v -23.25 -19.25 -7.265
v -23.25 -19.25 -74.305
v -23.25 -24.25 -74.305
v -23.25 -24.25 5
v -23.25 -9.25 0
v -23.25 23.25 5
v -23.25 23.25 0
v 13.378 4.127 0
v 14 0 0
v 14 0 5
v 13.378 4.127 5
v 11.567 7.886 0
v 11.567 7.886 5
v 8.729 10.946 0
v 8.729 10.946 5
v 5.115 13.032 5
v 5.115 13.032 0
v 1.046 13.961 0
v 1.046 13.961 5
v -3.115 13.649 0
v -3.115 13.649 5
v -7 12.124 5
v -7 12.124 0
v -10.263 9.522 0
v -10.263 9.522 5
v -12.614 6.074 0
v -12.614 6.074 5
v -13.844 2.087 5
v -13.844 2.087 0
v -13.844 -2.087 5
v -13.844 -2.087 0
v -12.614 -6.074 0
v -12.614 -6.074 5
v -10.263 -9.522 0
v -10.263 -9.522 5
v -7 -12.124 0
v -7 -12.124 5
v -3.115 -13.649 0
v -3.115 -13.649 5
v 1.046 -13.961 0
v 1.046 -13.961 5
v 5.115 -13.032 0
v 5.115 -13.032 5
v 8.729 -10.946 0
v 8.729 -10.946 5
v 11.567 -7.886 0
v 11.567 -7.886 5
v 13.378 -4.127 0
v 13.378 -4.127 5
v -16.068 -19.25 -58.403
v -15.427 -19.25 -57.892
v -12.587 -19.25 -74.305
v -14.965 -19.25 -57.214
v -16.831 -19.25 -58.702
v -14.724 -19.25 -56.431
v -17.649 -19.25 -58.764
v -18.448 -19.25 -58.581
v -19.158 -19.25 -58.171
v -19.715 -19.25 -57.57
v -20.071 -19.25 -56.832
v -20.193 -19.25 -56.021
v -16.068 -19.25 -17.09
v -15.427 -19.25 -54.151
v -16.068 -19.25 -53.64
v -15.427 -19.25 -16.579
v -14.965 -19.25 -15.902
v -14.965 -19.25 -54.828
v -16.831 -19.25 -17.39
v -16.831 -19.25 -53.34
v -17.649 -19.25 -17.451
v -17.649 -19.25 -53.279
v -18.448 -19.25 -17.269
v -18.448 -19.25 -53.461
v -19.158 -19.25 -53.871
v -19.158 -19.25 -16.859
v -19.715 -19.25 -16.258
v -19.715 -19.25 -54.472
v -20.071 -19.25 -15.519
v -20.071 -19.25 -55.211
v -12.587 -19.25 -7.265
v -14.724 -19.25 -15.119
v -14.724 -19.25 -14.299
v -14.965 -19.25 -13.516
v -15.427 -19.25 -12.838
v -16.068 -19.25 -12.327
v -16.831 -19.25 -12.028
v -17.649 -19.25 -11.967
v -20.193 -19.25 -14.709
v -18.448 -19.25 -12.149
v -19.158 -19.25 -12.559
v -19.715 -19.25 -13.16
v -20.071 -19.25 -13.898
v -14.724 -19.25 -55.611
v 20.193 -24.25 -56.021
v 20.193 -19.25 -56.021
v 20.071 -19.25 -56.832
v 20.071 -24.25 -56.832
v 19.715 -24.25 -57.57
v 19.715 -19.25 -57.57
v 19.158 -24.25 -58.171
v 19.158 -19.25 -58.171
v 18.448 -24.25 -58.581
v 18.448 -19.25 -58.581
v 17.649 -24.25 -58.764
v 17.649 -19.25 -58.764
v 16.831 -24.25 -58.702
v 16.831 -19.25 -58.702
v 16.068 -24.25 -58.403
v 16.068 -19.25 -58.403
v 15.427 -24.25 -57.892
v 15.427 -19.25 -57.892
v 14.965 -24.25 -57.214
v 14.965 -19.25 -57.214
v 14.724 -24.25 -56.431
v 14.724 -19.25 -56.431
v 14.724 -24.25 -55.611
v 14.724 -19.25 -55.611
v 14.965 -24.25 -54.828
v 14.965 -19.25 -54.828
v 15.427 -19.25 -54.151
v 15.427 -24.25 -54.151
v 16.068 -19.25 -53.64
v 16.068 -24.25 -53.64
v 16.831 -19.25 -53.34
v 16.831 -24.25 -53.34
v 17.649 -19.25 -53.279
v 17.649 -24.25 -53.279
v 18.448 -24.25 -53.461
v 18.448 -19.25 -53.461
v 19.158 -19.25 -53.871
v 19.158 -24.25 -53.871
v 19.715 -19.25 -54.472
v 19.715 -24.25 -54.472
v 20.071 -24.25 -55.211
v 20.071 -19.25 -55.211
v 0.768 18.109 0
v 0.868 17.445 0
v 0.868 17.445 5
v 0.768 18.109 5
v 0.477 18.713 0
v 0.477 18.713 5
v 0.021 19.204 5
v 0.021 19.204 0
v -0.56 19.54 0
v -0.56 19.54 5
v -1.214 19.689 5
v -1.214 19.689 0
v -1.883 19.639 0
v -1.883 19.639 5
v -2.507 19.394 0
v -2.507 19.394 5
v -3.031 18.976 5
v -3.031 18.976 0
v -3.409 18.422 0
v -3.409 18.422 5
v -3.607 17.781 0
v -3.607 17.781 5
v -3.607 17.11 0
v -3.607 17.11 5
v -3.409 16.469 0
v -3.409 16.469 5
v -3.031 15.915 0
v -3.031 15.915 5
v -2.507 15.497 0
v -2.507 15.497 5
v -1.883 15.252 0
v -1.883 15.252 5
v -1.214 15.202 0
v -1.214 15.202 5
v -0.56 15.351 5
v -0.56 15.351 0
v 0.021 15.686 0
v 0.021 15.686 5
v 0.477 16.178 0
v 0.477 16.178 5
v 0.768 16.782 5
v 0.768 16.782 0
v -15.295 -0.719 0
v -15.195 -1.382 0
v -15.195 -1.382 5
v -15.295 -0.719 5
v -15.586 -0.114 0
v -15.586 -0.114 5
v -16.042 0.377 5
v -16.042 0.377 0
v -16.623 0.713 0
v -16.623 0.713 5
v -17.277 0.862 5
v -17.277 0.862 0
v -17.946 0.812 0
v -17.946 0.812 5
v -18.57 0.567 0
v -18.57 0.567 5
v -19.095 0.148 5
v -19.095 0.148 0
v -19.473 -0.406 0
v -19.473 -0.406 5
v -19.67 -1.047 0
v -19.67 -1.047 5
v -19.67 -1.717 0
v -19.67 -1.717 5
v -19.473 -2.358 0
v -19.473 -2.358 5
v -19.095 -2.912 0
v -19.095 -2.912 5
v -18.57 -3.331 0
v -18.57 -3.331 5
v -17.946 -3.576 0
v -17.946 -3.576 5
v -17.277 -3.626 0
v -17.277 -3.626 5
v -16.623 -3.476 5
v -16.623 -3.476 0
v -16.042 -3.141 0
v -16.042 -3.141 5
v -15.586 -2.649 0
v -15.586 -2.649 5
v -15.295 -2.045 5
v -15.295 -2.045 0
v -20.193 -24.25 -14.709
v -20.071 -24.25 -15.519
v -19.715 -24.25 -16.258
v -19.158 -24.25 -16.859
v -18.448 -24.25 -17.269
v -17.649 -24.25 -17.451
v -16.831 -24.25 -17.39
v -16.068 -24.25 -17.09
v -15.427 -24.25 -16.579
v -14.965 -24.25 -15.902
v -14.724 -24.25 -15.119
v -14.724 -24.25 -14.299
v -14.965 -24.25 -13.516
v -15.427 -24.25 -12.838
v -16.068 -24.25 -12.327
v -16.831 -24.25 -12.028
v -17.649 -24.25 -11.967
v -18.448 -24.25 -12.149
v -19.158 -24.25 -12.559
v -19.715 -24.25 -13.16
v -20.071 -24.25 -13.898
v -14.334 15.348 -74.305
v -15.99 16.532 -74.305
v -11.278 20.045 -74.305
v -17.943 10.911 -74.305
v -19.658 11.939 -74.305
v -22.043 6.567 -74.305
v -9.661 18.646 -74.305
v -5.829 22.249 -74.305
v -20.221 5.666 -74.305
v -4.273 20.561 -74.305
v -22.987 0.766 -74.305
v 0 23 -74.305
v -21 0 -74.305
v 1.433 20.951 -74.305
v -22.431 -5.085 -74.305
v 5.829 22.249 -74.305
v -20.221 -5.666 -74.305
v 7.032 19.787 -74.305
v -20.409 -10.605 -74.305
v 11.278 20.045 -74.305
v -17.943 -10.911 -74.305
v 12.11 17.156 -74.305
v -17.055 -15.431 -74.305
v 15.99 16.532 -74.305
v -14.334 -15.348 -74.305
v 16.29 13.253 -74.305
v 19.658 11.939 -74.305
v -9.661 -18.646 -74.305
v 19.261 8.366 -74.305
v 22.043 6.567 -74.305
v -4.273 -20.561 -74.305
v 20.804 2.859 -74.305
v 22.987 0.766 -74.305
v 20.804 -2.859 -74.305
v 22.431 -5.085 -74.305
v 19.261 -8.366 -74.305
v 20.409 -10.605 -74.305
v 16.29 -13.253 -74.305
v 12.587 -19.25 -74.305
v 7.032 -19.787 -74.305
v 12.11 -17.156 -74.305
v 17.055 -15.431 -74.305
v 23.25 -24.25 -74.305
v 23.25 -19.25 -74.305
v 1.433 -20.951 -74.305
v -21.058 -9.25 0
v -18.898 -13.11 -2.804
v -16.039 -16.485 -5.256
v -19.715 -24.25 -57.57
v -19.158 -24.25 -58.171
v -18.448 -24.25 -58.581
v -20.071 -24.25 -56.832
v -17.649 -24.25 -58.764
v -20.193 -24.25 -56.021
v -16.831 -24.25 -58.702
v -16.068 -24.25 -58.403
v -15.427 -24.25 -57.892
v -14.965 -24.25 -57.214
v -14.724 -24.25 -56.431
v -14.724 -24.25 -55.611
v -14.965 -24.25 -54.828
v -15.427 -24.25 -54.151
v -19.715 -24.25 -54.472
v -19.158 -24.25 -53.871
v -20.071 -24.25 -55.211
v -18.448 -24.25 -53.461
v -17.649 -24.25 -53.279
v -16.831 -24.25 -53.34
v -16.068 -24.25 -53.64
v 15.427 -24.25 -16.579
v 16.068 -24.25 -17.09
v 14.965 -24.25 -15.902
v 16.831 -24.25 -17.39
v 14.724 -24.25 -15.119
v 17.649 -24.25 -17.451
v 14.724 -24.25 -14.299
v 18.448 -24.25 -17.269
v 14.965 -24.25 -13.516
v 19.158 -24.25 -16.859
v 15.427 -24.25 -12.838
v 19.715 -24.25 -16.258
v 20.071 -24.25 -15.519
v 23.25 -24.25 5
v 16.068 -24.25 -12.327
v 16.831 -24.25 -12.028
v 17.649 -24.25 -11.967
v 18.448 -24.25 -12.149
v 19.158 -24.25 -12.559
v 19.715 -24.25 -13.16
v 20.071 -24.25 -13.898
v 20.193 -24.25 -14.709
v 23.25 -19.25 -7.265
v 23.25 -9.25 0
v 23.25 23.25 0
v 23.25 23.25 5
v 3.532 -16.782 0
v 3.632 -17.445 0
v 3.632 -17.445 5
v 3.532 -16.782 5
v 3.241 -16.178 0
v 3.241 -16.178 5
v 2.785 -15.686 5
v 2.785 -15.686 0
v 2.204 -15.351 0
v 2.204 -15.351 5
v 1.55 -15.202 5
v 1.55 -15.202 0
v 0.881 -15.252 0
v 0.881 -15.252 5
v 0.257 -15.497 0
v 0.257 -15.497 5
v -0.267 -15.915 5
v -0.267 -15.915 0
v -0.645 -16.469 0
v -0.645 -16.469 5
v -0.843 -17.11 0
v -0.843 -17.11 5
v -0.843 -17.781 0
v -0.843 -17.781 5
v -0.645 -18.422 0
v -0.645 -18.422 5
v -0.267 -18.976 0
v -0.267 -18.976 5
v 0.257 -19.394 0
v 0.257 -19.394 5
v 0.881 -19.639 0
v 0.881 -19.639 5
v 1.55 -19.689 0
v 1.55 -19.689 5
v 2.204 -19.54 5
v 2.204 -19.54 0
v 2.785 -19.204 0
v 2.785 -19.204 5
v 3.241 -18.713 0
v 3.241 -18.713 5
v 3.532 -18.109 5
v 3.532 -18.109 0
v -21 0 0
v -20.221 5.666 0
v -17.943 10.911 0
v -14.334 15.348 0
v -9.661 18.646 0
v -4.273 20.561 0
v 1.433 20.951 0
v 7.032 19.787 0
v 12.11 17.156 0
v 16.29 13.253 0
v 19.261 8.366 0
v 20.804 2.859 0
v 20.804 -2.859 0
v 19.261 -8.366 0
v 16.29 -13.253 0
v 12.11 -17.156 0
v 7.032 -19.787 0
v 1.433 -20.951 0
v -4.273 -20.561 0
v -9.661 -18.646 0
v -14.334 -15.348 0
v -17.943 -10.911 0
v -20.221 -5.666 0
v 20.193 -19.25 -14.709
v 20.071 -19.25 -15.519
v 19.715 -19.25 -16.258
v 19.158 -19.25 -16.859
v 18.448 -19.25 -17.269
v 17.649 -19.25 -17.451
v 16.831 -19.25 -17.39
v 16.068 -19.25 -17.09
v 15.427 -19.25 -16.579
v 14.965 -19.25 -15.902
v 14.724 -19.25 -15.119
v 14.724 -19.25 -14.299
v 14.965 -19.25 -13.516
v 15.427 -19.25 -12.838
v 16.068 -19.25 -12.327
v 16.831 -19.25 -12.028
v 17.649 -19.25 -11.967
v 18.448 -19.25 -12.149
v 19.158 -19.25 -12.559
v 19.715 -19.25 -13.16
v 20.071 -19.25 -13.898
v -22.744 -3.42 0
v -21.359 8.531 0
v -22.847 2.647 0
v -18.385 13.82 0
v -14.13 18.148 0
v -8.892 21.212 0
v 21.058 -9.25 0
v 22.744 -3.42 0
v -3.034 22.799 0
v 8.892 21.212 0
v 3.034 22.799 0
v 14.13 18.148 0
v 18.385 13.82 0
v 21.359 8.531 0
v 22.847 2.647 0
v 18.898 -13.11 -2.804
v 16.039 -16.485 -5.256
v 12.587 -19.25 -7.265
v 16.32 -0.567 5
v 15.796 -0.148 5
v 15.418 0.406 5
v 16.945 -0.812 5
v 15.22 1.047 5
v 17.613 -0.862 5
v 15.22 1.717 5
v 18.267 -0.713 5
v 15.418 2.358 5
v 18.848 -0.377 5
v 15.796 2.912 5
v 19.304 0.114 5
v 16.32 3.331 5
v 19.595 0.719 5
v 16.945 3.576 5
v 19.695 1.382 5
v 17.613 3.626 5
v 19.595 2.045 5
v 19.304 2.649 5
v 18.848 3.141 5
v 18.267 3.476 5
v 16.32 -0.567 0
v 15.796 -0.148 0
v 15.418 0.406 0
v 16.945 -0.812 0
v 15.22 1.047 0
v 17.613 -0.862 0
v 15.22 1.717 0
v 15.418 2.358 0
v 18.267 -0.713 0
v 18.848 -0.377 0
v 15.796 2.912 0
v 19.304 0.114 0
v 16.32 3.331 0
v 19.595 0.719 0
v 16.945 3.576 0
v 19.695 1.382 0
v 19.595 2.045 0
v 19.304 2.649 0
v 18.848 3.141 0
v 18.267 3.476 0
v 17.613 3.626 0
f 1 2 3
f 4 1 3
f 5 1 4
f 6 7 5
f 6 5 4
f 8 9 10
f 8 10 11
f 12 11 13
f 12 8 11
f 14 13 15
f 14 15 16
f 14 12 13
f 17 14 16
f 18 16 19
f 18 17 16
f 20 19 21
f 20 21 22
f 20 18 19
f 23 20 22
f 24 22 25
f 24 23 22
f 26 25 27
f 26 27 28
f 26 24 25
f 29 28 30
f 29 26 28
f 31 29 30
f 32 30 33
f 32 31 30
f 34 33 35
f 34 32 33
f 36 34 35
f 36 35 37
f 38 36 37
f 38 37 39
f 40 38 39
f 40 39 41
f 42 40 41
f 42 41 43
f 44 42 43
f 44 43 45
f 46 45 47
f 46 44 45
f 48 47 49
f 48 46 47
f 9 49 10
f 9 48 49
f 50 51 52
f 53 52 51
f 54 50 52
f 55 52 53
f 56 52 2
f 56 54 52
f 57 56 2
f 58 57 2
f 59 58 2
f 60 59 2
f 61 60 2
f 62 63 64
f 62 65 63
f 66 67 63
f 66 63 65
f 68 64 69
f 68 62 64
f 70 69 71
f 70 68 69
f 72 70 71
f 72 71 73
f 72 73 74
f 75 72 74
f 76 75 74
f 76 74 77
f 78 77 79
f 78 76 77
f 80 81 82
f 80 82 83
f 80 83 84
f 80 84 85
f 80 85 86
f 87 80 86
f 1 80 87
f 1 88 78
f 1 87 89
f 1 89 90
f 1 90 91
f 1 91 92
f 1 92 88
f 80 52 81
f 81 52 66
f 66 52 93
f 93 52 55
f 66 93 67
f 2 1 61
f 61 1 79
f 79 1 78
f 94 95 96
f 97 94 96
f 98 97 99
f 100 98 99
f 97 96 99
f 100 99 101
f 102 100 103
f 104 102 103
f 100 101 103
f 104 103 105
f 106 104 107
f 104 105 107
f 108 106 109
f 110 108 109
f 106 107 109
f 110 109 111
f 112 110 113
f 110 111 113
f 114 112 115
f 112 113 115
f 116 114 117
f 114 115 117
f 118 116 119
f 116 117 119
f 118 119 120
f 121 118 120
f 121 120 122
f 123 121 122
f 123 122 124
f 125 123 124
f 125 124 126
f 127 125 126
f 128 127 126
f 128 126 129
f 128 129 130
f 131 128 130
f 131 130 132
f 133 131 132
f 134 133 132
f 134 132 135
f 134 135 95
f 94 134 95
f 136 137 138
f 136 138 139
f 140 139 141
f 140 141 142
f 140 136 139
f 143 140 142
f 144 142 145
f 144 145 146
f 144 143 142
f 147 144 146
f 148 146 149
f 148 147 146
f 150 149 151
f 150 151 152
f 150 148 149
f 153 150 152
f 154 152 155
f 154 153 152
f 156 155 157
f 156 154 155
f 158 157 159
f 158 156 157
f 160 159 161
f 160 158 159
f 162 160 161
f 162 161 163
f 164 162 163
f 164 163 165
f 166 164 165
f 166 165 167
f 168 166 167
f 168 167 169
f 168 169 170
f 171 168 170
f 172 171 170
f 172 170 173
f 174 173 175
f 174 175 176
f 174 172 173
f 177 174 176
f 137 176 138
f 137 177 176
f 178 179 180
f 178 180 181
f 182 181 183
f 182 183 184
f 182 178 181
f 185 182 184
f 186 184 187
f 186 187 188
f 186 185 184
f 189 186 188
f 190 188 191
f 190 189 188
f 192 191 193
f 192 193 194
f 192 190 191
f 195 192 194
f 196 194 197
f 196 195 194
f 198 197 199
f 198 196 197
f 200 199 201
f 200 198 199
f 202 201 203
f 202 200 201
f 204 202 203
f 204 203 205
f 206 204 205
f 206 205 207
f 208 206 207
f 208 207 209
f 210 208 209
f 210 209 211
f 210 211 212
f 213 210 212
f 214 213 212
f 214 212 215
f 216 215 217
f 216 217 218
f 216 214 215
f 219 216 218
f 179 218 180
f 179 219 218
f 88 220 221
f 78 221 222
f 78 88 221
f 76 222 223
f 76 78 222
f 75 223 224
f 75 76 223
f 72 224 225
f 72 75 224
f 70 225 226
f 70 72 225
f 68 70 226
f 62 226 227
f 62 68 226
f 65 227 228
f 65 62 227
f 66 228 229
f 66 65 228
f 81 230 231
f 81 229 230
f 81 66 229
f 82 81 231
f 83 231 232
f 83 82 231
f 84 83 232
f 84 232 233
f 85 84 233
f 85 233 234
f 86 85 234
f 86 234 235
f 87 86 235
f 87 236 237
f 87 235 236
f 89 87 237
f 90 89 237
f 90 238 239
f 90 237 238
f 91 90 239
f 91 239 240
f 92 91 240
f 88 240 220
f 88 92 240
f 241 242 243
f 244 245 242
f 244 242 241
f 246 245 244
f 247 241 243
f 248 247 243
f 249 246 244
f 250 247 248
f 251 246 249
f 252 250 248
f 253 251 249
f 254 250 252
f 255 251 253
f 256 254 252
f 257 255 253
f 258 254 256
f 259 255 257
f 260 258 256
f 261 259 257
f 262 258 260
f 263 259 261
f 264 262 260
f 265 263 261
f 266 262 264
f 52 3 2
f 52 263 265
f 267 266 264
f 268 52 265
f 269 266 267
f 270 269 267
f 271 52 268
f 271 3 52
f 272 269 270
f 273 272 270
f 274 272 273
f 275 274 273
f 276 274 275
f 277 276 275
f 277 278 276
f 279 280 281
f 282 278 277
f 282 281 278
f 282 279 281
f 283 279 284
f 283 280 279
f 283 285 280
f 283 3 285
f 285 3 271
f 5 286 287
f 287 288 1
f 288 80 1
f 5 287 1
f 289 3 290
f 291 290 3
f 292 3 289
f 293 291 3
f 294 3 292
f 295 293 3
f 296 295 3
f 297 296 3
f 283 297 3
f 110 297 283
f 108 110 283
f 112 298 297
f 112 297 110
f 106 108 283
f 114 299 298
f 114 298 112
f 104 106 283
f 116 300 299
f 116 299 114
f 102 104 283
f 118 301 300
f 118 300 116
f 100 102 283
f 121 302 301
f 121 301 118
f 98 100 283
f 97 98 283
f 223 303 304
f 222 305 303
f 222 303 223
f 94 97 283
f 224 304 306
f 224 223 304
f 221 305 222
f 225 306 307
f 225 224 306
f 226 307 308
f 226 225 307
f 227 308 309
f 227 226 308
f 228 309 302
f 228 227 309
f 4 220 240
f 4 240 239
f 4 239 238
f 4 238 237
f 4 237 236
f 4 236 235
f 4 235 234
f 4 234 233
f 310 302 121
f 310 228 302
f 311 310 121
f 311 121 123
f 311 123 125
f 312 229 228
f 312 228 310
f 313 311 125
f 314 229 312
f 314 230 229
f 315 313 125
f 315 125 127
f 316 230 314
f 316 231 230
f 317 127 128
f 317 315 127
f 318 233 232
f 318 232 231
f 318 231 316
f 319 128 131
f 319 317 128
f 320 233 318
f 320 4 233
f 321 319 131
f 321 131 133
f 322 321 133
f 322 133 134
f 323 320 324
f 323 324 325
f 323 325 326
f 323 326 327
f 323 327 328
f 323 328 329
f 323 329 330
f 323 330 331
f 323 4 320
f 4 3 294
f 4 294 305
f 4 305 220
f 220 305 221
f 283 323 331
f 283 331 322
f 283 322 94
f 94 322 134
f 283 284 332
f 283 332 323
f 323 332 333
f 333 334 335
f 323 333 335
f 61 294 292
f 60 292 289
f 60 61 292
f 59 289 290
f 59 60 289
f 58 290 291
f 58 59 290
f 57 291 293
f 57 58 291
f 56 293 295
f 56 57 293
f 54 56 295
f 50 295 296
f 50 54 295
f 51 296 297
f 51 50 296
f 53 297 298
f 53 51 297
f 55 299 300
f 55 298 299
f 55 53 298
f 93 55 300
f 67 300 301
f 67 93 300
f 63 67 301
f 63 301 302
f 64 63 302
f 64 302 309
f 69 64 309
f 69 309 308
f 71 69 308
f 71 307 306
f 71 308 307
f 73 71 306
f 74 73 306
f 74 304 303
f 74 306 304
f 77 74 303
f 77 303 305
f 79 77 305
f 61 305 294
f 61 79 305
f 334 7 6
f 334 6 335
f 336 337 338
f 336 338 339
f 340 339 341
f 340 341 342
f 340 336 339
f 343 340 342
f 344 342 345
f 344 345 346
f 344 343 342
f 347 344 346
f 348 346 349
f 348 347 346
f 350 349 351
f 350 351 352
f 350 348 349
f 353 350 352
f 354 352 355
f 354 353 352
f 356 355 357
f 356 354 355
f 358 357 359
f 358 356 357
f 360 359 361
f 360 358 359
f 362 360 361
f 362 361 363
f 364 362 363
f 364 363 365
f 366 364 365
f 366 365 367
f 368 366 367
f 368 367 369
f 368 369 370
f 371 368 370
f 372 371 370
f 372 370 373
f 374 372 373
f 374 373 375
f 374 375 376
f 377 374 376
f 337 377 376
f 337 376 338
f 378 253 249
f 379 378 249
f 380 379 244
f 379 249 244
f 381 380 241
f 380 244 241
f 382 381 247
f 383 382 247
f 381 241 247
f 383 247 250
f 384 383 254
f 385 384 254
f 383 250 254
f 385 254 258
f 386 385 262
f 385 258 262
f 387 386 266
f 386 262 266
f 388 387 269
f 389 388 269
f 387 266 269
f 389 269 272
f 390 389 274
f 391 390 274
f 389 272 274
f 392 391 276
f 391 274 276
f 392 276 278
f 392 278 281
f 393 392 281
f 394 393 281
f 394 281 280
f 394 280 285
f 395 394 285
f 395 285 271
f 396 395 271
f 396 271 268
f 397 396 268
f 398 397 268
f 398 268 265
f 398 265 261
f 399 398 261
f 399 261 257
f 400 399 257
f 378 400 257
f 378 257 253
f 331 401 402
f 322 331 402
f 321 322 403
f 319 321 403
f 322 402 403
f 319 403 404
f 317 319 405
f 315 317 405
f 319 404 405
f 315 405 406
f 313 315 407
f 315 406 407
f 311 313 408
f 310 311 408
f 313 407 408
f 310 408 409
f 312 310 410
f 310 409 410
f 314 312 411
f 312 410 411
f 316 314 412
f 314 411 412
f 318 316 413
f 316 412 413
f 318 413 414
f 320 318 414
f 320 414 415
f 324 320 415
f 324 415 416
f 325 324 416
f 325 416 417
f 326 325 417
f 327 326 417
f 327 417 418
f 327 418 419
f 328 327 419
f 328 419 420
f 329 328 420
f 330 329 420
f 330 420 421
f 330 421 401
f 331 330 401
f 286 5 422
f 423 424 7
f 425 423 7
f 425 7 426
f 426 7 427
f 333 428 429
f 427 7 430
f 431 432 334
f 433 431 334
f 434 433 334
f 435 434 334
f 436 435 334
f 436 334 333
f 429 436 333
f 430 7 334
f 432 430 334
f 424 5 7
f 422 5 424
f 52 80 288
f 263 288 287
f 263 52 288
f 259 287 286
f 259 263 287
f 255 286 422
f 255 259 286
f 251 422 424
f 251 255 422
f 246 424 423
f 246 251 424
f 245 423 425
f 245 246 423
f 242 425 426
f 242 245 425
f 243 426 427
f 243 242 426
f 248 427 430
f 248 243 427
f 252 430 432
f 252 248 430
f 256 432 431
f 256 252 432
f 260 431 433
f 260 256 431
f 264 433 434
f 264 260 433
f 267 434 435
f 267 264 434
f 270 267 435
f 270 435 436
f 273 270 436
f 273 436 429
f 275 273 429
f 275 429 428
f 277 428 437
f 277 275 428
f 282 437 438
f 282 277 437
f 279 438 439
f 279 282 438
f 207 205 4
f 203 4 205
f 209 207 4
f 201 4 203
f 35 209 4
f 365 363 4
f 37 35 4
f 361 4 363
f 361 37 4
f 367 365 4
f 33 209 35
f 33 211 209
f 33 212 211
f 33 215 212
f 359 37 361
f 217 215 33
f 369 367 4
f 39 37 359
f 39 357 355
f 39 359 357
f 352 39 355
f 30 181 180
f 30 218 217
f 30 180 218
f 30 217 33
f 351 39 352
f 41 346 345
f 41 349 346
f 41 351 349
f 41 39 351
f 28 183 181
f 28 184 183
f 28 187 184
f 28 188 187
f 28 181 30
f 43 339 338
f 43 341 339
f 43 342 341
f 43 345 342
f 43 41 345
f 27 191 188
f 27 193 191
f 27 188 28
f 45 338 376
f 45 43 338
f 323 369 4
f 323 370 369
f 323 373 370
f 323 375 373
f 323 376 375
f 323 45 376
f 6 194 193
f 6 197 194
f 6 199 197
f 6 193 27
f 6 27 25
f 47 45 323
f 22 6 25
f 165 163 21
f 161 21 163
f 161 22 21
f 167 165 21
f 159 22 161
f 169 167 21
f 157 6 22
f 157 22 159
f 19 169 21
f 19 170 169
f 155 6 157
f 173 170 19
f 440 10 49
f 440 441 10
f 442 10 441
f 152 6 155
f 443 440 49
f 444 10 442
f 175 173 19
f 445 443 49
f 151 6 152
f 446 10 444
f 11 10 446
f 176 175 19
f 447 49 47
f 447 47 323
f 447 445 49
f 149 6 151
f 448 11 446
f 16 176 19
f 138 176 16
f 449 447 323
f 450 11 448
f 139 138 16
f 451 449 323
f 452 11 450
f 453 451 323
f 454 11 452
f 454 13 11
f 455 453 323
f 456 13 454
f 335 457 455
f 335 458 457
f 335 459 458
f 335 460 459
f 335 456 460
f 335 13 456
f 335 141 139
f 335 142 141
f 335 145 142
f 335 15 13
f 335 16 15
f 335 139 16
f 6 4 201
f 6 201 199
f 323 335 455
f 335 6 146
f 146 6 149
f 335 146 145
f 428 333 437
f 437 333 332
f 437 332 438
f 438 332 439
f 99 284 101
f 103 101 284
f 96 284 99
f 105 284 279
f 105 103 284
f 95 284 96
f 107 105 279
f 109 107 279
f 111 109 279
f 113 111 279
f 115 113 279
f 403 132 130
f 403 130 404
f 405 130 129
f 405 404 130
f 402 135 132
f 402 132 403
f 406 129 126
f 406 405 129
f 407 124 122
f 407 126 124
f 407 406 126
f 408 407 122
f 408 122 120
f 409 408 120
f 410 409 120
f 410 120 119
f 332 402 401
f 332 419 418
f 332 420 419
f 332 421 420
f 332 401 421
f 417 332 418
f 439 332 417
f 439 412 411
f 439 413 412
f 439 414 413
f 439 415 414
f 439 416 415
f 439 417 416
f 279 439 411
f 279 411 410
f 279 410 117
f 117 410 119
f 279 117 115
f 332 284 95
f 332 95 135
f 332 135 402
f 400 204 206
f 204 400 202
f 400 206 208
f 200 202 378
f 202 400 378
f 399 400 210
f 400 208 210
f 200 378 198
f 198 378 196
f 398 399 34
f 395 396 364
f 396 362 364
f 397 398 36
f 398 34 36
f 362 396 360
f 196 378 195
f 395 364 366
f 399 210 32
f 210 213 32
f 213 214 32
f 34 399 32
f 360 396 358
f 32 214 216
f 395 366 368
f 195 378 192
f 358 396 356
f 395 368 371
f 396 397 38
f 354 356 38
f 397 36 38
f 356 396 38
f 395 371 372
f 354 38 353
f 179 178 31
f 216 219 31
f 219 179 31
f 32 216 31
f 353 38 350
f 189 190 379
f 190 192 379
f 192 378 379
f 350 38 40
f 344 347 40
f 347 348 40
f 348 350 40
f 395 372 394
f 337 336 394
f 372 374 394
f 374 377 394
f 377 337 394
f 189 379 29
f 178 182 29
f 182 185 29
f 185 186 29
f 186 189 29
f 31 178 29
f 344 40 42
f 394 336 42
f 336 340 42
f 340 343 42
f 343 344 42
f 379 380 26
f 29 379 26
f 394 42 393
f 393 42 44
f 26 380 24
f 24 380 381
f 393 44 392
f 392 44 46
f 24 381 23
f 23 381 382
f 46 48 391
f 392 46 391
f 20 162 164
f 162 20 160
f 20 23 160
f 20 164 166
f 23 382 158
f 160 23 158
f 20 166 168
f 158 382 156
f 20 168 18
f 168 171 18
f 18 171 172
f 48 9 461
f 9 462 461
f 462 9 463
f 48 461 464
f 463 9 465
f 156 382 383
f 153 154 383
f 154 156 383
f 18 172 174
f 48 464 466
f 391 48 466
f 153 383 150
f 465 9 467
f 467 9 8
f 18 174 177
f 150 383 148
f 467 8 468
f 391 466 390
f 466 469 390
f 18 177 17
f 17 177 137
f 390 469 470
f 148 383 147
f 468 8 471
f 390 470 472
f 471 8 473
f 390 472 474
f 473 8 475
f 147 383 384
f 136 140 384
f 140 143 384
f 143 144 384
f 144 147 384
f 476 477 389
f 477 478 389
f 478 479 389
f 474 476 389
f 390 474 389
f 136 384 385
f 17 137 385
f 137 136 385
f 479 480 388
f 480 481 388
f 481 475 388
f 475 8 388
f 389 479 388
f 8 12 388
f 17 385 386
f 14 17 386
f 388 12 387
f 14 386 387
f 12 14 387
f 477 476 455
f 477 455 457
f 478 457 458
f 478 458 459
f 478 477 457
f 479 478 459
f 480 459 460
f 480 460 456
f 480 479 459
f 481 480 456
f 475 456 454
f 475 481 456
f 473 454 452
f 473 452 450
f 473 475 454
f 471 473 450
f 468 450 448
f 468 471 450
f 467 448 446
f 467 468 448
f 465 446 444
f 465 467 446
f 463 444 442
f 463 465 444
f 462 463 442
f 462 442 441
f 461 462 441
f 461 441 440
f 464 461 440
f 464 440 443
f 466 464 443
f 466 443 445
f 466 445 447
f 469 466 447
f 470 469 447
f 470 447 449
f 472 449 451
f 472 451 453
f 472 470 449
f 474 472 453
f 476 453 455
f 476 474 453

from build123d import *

# Parameters (mm, degrees)
SKETCH1_W           = 46.5
SKETCH1_H           = 46.5
SKETCH1_R           = 14
SKETCH1_R_2         = 2.25
BOSS_EXTRUDE1_DEPTH = 5
SKETCH2_W           = 46.5
SKETCH2_H           = 5
BOSS_EXTRUDE2_DEPTH = 149
SKETCH4_W           = 46.5
SKETCH4_H           = 5
BOSS_EXTRUDE3_DEPTH = 1
SKETCH5_R           = 2.75
CUT_EXTRUDE1_DEPTH  = 10
SKETCH9_R           = 23
CUT_EXTRUDE2_DEPTH  = 149
SKETCH10_R          = 23
SKETCH10_R_2        = 21
BOSS_EXTRUDE4_DEPTH = 149
CHAMFER1_SIZE       = 10
CHAMFER1_SIZE2      = 7.26542528
CHAMFER2_SIZE       = 10
CHAMFER2_SIZE2      = 7.26542528
SKETCH11_W          = 46.5
SKETCH11_H          = 74.694653746
CUT_EXTRUDE3_DEPTH  = 149


with BuildPart() as part:
    # Sketch1 → Boss-Extrude1 (new body)
    with BuildSketch(Plane.XY):
        Rectangle(SKETCH1_W, SKETCH1_H)
        Circle(SKETCH1_R, mode=Mode.SUBTRACT)
        with Locations((-1.381951843, 17.445349211)):
            Circle(SKETCH1_R_2, mode=Mode.SUBTRACT)
        with Locations((17.445349211, 1.381951843)):
            Circle(SKETCH1_R_2, mode=Mode.SUBTRACT)
        with Locations((1.381951843, -17.445349211)):
            Circle(SKETCH1_R_2, mode=Mode.SUBTRACT)
        with Locations((-17.445349211, -1.381951843)):
            Circle(SKETCH1_R_2, mode=Mode.SUBTRACT)
    extrude(amount=BOSS_EXTRUDE1_DEPTH)

    # Sketch2 → Boss-Extrude2 (add)
    with BuildSketch(Plane(origin=(0, 0, 0), x_dir=(-1, 0, 0), z_dir=(0, 0, -1))):
        with Locations((0, -21.75)):
            Rectangle(SKETCH2_W, SKETCH2_H)
    extrude(amount=BOSS_EXTRUDE2_DEPTH)

    # Sketch4 → Boss-Extrude3 (add)
    with BuildSketch(Plane.XZ.offset(23.25)):
        with Locations((0, 2.5)):
            Rectangle(SKETCH4_W, SKETCH4_H)
    extrude(amount=BOSS_EXTRUDE3_DEPTH)

    # Sketch5 → Cut-Extrude1 (cut)
    with BuildSketch(Plane(origin=(0, -19.25, 0), x_dir=(1, 0, 0), z_dir=(0, 1, 0))):
        with Locations((17.443135508, 14.708820521)):
            Circle(SKETCH5_R)
        with Locations((17.443135508, 87.833686256)):
            Circle(SKETCH5_R)
        with Locations((17.443135508, 56.021234434)):
            Circle(SKETCH5_R)
        with Locations((17.443135508, 129.140706858)):
            Circle(SKETCH5_R)
    cut_extrude1 = extrude(amount=-CUT_EXTRUDE1_DEPTH, mode=Mode.SUBTRACT)

    # Mirror1: Cut-Extrude1 across plane
    add(cut_extrude1.mirror(Plane(origin=(0, 0, 0), x_dir=(0, 0, 1), z_dir=(1, 0, 0))), mode=Mode.SUBTRACT)

    # Sketch9 → Cut-Extrude2 (cut)
    with BuildSketch(Plane(origin=(0, 0, -149), x_dir=(-1, 0, 0), z_dir=(0, 0, -1))):
        Circle(SKETCH9_R)
    extrude(amount=-CUT_EXTRUDE2_DEPTH, mode=Mode.SUBTRACT)

    # Sketch10 → Boss-Extrude4 (add)
    with BuildSketch(Plane(origin=(0, 0, -149), x_dir=(-1, 0, 0), z_dir=(0, 0, -1))):
        Circle(SKETCH10_R)
        Circle(SKETCH10_R_2, mode=Mode.SUBTRACT)
    extrude(amount=-BOSS_EXTRUDE4_DEPTH)

    # Chamfer1
    chamfer1_edges = [part.edges().sort_by_distance(p)[0] for p in [
        (17.918597938, -19.25, 0),
    ]]
    chamfer1_side = [part.faces().sort_by_distance(p)[0] for p in [
        (0, 23.062996032, 0),
    ]]
    chamfer(chamfer1_edges, length=CHAMFER1_SIZE, length2=CHAMFER1_SIZE2, reference=chamfer1_side[0])

    # Chamfer2
    chamfer2_edges = [part.edges().sort_by_distance(p)[0] for p in [
        (-17.918597938, -19.25, 0),
    ]]
    chamfer2_side = [part.faces().sort_by_distance(p)[0] for p in [
        (-6.732220056, 22.650656451, 0),
    ]]
    chamfer(chamfer2_edges, length=CHAMFER2_SIZE, length2=CHAMFER2_SIZE2, reference=chamfer2_side[0])

    # Sketch11 → Cut-Extrude3 (cut)
    with BuildSketch(Plane.XZ.offset(24.25)):
        with Locations((0, -111.652673127)):
            Rectangle(SKETCH11_W, SKETCH11_H)
    extrude(amount=-CUT_EXTRUDE3_DEPTH, mode=Mode.SUBTRACT)


solid = part.part
